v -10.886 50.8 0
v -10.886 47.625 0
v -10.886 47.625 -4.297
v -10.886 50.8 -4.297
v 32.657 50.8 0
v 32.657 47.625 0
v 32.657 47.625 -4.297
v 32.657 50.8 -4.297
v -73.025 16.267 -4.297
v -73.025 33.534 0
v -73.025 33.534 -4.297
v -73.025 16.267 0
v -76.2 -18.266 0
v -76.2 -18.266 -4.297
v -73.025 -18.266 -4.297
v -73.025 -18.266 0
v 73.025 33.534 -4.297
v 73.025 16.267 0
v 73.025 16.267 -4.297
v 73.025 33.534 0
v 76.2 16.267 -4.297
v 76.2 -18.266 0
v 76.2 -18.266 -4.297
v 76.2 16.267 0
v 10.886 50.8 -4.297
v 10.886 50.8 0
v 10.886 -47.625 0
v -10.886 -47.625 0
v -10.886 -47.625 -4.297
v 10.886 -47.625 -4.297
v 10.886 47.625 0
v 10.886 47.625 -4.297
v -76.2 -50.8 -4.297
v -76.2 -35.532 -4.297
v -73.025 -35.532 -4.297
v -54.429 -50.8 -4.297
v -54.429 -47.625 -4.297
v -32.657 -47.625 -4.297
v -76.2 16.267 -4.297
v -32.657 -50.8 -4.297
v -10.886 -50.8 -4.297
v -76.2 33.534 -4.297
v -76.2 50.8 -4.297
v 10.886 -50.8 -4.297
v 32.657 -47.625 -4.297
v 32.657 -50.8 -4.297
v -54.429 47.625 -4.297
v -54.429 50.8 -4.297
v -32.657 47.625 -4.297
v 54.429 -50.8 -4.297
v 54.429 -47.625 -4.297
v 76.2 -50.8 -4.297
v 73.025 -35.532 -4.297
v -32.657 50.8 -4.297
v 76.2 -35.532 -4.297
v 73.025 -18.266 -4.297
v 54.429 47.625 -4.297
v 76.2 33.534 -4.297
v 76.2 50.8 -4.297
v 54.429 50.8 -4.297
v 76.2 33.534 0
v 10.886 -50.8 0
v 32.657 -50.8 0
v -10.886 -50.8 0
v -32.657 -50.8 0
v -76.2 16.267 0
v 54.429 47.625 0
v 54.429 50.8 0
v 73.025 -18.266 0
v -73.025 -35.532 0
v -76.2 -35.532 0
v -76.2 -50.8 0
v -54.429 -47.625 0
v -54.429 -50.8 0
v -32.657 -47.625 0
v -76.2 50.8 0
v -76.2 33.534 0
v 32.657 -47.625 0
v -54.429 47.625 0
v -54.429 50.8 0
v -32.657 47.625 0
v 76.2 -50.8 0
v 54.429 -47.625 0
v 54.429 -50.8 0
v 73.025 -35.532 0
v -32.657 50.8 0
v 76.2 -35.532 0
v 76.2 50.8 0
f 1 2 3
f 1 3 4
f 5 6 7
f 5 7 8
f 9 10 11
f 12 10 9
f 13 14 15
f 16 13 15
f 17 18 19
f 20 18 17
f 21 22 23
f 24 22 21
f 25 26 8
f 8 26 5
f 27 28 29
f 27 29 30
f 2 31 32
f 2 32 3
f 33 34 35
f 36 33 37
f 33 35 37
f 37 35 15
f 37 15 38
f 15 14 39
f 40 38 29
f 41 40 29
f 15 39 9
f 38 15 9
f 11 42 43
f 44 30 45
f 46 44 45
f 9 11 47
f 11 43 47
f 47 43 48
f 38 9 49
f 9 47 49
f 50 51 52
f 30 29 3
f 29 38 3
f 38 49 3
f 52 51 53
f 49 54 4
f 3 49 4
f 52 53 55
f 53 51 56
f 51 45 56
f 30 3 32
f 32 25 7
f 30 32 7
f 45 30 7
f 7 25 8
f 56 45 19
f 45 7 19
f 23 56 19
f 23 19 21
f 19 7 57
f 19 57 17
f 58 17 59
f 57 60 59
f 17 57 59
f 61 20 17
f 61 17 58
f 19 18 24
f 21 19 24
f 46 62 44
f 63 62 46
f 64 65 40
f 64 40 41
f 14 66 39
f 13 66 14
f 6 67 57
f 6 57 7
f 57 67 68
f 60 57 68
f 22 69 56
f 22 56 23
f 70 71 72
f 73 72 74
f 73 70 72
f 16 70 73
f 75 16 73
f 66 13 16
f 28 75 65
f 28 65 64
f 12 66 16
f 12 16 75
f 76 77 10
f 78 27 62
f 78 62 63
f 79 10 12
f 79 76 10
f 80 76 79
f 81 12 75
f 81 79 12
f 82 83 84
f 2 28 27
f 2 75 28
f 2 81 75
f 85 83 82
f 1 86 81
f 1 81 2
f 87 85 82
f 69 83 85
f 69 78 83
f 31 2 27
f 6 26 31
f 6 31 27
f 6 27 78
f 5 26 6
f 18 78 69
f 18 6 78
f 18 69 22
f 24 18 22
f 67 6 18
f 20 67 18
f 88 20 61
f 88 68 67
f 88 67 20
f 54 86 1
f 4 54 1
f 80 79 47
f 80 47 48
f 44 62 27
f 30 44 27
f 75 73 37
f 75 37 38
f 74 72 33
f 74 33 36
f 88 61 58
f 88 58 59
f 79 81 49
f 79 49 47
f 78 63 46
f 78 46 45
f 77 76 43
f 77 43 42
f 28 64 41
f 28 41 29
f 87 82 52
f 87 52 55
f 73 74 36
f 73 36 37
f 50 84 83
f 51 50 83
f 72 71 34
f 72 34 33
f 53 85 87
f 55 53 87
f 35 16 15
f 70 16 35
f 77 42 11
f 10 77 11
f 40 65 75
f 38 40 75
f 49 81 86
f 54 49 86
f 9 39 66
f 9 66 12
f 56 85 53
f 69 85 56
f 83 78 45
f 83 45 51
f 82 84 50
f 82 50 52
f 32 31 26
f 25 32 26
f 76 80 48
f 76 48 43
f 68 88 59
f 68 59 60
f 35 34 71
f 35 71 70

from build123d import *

# Parameters (mm, degrees)
F0_W     = 3.175
F0_H     = 14.0914226329
F0_H_2   = 17.2664226329
F0_H_3   = 12.0928868353
F0_W_2   = 18.5964285714
F0_H_4   = 3.175
F0_W_3   = 21.7714285714
F1_DEPTH = 4.29735


with BuildPart() as f1:
    # F0 (on Top) → F1 (new body)
    with BuildSketch(Plane.XY):
        with Locations((74.6125, 40.5792886835)):
            Rectangle(F0_W, F0_H)
        with Locations((74.6125, 7.6339434177)):
            Rectangle(F0_W, F0_H_2)
        with Locations((74.6125, -9.6324792153)):
            Rectangle(F0_W, F0_H_2)
        with Locations((74.6125, -41.5785565823)):
            Rectangle(F0_W, F0_H_3)
        with Locations((63.7267857143, -49.2125)):
            Rectangle(F0_W_2, F0_H_4)
        with Locations((21.7714285714, -49.2125)):
            Rectangle(F0_W_3, F0_H_4)
        with Locations((-21.7714285714, -49.2125)):
            Rectangle(F0_W_3, F0_H_4)
        with Locations((-63.7267857143, -49.2125)):
            Rectangle(F0_W_2, F0_H_4)
        with Locations((-74.6125, -41.5785565823)):
            Rectangle(F0_W, F0_H_3)
        with Locations((-74.6125, -9.6324792153)):
            Rectangle(F0_W, F0_H_2)
        with Locations((-74.6125, 7.6339434177)):
            Rectangle(F0_W, F0_H_2)
        with Locations((-74.6125, 40.5792886835)):
            Rectangle(F0_W, F0_H)
        with Locations((-63.7267857143, 49.2125)):
            Rectangle(F0_W_2, F0_H_4)
        with Locations((-21.7714285714, 49.2125)):
            Rectangle(F0_W_3, F0_H_4)
        with Locations((21.7714285714, 49.2125)):
            Rectangle(F0_W_3, F0_H_4)
        with Locations((63.7267857143, 49.2125)):
            Rectangle(F0_W_2, F0_H_4)
        Polygon((54.4285714286, -47.625), (73.025, -47.625), (73.025, -35.5321131647), (73.025, -18.2656905317), (73.025, -0.9992678988), (73.025, 16.2671547341), (73.025, 33.5335773671), (73.025, 47.625), (54.4285714286, 47.625), (32.6571428571, 47.625), (10.8857142857, 47.625), (-10.8857142857, 47.625), (-32.6571428571, 47.625), (-54.4285714286, 47.625), (-73.025, 47.625), (-73.025, 33.5335773671), (-73.025, 16.2671547341), (-73.025, -0.9992678988), (-73.025, -18.2656905317), (-73.025, -35.5321131647), (-73.025, -47.625), (-54.4285714286, -47.625), (-32.6571428571, -47.625), (-10.8857142857, -47.625), (10.8857142857, -47.625), (32.6571428571, -47.625), align=None)
        with Locations((74.6125, 49.2125)):
            Rectangle(F0_W, F0_H_4)
        with Locations((74.6125, -49.2125)):
            Rectangle(F0_W, F0_H_4)
        with Locations((-74.6125, -49.2125)):
            Rectangle(F0_W, F0_H_4)
        with Locations((-74.6125, 49.2125)):
            Rectangle(F0_W, F0_H_4)
    extrude(amount=-F1_DEPTH)


solid = f1.part
